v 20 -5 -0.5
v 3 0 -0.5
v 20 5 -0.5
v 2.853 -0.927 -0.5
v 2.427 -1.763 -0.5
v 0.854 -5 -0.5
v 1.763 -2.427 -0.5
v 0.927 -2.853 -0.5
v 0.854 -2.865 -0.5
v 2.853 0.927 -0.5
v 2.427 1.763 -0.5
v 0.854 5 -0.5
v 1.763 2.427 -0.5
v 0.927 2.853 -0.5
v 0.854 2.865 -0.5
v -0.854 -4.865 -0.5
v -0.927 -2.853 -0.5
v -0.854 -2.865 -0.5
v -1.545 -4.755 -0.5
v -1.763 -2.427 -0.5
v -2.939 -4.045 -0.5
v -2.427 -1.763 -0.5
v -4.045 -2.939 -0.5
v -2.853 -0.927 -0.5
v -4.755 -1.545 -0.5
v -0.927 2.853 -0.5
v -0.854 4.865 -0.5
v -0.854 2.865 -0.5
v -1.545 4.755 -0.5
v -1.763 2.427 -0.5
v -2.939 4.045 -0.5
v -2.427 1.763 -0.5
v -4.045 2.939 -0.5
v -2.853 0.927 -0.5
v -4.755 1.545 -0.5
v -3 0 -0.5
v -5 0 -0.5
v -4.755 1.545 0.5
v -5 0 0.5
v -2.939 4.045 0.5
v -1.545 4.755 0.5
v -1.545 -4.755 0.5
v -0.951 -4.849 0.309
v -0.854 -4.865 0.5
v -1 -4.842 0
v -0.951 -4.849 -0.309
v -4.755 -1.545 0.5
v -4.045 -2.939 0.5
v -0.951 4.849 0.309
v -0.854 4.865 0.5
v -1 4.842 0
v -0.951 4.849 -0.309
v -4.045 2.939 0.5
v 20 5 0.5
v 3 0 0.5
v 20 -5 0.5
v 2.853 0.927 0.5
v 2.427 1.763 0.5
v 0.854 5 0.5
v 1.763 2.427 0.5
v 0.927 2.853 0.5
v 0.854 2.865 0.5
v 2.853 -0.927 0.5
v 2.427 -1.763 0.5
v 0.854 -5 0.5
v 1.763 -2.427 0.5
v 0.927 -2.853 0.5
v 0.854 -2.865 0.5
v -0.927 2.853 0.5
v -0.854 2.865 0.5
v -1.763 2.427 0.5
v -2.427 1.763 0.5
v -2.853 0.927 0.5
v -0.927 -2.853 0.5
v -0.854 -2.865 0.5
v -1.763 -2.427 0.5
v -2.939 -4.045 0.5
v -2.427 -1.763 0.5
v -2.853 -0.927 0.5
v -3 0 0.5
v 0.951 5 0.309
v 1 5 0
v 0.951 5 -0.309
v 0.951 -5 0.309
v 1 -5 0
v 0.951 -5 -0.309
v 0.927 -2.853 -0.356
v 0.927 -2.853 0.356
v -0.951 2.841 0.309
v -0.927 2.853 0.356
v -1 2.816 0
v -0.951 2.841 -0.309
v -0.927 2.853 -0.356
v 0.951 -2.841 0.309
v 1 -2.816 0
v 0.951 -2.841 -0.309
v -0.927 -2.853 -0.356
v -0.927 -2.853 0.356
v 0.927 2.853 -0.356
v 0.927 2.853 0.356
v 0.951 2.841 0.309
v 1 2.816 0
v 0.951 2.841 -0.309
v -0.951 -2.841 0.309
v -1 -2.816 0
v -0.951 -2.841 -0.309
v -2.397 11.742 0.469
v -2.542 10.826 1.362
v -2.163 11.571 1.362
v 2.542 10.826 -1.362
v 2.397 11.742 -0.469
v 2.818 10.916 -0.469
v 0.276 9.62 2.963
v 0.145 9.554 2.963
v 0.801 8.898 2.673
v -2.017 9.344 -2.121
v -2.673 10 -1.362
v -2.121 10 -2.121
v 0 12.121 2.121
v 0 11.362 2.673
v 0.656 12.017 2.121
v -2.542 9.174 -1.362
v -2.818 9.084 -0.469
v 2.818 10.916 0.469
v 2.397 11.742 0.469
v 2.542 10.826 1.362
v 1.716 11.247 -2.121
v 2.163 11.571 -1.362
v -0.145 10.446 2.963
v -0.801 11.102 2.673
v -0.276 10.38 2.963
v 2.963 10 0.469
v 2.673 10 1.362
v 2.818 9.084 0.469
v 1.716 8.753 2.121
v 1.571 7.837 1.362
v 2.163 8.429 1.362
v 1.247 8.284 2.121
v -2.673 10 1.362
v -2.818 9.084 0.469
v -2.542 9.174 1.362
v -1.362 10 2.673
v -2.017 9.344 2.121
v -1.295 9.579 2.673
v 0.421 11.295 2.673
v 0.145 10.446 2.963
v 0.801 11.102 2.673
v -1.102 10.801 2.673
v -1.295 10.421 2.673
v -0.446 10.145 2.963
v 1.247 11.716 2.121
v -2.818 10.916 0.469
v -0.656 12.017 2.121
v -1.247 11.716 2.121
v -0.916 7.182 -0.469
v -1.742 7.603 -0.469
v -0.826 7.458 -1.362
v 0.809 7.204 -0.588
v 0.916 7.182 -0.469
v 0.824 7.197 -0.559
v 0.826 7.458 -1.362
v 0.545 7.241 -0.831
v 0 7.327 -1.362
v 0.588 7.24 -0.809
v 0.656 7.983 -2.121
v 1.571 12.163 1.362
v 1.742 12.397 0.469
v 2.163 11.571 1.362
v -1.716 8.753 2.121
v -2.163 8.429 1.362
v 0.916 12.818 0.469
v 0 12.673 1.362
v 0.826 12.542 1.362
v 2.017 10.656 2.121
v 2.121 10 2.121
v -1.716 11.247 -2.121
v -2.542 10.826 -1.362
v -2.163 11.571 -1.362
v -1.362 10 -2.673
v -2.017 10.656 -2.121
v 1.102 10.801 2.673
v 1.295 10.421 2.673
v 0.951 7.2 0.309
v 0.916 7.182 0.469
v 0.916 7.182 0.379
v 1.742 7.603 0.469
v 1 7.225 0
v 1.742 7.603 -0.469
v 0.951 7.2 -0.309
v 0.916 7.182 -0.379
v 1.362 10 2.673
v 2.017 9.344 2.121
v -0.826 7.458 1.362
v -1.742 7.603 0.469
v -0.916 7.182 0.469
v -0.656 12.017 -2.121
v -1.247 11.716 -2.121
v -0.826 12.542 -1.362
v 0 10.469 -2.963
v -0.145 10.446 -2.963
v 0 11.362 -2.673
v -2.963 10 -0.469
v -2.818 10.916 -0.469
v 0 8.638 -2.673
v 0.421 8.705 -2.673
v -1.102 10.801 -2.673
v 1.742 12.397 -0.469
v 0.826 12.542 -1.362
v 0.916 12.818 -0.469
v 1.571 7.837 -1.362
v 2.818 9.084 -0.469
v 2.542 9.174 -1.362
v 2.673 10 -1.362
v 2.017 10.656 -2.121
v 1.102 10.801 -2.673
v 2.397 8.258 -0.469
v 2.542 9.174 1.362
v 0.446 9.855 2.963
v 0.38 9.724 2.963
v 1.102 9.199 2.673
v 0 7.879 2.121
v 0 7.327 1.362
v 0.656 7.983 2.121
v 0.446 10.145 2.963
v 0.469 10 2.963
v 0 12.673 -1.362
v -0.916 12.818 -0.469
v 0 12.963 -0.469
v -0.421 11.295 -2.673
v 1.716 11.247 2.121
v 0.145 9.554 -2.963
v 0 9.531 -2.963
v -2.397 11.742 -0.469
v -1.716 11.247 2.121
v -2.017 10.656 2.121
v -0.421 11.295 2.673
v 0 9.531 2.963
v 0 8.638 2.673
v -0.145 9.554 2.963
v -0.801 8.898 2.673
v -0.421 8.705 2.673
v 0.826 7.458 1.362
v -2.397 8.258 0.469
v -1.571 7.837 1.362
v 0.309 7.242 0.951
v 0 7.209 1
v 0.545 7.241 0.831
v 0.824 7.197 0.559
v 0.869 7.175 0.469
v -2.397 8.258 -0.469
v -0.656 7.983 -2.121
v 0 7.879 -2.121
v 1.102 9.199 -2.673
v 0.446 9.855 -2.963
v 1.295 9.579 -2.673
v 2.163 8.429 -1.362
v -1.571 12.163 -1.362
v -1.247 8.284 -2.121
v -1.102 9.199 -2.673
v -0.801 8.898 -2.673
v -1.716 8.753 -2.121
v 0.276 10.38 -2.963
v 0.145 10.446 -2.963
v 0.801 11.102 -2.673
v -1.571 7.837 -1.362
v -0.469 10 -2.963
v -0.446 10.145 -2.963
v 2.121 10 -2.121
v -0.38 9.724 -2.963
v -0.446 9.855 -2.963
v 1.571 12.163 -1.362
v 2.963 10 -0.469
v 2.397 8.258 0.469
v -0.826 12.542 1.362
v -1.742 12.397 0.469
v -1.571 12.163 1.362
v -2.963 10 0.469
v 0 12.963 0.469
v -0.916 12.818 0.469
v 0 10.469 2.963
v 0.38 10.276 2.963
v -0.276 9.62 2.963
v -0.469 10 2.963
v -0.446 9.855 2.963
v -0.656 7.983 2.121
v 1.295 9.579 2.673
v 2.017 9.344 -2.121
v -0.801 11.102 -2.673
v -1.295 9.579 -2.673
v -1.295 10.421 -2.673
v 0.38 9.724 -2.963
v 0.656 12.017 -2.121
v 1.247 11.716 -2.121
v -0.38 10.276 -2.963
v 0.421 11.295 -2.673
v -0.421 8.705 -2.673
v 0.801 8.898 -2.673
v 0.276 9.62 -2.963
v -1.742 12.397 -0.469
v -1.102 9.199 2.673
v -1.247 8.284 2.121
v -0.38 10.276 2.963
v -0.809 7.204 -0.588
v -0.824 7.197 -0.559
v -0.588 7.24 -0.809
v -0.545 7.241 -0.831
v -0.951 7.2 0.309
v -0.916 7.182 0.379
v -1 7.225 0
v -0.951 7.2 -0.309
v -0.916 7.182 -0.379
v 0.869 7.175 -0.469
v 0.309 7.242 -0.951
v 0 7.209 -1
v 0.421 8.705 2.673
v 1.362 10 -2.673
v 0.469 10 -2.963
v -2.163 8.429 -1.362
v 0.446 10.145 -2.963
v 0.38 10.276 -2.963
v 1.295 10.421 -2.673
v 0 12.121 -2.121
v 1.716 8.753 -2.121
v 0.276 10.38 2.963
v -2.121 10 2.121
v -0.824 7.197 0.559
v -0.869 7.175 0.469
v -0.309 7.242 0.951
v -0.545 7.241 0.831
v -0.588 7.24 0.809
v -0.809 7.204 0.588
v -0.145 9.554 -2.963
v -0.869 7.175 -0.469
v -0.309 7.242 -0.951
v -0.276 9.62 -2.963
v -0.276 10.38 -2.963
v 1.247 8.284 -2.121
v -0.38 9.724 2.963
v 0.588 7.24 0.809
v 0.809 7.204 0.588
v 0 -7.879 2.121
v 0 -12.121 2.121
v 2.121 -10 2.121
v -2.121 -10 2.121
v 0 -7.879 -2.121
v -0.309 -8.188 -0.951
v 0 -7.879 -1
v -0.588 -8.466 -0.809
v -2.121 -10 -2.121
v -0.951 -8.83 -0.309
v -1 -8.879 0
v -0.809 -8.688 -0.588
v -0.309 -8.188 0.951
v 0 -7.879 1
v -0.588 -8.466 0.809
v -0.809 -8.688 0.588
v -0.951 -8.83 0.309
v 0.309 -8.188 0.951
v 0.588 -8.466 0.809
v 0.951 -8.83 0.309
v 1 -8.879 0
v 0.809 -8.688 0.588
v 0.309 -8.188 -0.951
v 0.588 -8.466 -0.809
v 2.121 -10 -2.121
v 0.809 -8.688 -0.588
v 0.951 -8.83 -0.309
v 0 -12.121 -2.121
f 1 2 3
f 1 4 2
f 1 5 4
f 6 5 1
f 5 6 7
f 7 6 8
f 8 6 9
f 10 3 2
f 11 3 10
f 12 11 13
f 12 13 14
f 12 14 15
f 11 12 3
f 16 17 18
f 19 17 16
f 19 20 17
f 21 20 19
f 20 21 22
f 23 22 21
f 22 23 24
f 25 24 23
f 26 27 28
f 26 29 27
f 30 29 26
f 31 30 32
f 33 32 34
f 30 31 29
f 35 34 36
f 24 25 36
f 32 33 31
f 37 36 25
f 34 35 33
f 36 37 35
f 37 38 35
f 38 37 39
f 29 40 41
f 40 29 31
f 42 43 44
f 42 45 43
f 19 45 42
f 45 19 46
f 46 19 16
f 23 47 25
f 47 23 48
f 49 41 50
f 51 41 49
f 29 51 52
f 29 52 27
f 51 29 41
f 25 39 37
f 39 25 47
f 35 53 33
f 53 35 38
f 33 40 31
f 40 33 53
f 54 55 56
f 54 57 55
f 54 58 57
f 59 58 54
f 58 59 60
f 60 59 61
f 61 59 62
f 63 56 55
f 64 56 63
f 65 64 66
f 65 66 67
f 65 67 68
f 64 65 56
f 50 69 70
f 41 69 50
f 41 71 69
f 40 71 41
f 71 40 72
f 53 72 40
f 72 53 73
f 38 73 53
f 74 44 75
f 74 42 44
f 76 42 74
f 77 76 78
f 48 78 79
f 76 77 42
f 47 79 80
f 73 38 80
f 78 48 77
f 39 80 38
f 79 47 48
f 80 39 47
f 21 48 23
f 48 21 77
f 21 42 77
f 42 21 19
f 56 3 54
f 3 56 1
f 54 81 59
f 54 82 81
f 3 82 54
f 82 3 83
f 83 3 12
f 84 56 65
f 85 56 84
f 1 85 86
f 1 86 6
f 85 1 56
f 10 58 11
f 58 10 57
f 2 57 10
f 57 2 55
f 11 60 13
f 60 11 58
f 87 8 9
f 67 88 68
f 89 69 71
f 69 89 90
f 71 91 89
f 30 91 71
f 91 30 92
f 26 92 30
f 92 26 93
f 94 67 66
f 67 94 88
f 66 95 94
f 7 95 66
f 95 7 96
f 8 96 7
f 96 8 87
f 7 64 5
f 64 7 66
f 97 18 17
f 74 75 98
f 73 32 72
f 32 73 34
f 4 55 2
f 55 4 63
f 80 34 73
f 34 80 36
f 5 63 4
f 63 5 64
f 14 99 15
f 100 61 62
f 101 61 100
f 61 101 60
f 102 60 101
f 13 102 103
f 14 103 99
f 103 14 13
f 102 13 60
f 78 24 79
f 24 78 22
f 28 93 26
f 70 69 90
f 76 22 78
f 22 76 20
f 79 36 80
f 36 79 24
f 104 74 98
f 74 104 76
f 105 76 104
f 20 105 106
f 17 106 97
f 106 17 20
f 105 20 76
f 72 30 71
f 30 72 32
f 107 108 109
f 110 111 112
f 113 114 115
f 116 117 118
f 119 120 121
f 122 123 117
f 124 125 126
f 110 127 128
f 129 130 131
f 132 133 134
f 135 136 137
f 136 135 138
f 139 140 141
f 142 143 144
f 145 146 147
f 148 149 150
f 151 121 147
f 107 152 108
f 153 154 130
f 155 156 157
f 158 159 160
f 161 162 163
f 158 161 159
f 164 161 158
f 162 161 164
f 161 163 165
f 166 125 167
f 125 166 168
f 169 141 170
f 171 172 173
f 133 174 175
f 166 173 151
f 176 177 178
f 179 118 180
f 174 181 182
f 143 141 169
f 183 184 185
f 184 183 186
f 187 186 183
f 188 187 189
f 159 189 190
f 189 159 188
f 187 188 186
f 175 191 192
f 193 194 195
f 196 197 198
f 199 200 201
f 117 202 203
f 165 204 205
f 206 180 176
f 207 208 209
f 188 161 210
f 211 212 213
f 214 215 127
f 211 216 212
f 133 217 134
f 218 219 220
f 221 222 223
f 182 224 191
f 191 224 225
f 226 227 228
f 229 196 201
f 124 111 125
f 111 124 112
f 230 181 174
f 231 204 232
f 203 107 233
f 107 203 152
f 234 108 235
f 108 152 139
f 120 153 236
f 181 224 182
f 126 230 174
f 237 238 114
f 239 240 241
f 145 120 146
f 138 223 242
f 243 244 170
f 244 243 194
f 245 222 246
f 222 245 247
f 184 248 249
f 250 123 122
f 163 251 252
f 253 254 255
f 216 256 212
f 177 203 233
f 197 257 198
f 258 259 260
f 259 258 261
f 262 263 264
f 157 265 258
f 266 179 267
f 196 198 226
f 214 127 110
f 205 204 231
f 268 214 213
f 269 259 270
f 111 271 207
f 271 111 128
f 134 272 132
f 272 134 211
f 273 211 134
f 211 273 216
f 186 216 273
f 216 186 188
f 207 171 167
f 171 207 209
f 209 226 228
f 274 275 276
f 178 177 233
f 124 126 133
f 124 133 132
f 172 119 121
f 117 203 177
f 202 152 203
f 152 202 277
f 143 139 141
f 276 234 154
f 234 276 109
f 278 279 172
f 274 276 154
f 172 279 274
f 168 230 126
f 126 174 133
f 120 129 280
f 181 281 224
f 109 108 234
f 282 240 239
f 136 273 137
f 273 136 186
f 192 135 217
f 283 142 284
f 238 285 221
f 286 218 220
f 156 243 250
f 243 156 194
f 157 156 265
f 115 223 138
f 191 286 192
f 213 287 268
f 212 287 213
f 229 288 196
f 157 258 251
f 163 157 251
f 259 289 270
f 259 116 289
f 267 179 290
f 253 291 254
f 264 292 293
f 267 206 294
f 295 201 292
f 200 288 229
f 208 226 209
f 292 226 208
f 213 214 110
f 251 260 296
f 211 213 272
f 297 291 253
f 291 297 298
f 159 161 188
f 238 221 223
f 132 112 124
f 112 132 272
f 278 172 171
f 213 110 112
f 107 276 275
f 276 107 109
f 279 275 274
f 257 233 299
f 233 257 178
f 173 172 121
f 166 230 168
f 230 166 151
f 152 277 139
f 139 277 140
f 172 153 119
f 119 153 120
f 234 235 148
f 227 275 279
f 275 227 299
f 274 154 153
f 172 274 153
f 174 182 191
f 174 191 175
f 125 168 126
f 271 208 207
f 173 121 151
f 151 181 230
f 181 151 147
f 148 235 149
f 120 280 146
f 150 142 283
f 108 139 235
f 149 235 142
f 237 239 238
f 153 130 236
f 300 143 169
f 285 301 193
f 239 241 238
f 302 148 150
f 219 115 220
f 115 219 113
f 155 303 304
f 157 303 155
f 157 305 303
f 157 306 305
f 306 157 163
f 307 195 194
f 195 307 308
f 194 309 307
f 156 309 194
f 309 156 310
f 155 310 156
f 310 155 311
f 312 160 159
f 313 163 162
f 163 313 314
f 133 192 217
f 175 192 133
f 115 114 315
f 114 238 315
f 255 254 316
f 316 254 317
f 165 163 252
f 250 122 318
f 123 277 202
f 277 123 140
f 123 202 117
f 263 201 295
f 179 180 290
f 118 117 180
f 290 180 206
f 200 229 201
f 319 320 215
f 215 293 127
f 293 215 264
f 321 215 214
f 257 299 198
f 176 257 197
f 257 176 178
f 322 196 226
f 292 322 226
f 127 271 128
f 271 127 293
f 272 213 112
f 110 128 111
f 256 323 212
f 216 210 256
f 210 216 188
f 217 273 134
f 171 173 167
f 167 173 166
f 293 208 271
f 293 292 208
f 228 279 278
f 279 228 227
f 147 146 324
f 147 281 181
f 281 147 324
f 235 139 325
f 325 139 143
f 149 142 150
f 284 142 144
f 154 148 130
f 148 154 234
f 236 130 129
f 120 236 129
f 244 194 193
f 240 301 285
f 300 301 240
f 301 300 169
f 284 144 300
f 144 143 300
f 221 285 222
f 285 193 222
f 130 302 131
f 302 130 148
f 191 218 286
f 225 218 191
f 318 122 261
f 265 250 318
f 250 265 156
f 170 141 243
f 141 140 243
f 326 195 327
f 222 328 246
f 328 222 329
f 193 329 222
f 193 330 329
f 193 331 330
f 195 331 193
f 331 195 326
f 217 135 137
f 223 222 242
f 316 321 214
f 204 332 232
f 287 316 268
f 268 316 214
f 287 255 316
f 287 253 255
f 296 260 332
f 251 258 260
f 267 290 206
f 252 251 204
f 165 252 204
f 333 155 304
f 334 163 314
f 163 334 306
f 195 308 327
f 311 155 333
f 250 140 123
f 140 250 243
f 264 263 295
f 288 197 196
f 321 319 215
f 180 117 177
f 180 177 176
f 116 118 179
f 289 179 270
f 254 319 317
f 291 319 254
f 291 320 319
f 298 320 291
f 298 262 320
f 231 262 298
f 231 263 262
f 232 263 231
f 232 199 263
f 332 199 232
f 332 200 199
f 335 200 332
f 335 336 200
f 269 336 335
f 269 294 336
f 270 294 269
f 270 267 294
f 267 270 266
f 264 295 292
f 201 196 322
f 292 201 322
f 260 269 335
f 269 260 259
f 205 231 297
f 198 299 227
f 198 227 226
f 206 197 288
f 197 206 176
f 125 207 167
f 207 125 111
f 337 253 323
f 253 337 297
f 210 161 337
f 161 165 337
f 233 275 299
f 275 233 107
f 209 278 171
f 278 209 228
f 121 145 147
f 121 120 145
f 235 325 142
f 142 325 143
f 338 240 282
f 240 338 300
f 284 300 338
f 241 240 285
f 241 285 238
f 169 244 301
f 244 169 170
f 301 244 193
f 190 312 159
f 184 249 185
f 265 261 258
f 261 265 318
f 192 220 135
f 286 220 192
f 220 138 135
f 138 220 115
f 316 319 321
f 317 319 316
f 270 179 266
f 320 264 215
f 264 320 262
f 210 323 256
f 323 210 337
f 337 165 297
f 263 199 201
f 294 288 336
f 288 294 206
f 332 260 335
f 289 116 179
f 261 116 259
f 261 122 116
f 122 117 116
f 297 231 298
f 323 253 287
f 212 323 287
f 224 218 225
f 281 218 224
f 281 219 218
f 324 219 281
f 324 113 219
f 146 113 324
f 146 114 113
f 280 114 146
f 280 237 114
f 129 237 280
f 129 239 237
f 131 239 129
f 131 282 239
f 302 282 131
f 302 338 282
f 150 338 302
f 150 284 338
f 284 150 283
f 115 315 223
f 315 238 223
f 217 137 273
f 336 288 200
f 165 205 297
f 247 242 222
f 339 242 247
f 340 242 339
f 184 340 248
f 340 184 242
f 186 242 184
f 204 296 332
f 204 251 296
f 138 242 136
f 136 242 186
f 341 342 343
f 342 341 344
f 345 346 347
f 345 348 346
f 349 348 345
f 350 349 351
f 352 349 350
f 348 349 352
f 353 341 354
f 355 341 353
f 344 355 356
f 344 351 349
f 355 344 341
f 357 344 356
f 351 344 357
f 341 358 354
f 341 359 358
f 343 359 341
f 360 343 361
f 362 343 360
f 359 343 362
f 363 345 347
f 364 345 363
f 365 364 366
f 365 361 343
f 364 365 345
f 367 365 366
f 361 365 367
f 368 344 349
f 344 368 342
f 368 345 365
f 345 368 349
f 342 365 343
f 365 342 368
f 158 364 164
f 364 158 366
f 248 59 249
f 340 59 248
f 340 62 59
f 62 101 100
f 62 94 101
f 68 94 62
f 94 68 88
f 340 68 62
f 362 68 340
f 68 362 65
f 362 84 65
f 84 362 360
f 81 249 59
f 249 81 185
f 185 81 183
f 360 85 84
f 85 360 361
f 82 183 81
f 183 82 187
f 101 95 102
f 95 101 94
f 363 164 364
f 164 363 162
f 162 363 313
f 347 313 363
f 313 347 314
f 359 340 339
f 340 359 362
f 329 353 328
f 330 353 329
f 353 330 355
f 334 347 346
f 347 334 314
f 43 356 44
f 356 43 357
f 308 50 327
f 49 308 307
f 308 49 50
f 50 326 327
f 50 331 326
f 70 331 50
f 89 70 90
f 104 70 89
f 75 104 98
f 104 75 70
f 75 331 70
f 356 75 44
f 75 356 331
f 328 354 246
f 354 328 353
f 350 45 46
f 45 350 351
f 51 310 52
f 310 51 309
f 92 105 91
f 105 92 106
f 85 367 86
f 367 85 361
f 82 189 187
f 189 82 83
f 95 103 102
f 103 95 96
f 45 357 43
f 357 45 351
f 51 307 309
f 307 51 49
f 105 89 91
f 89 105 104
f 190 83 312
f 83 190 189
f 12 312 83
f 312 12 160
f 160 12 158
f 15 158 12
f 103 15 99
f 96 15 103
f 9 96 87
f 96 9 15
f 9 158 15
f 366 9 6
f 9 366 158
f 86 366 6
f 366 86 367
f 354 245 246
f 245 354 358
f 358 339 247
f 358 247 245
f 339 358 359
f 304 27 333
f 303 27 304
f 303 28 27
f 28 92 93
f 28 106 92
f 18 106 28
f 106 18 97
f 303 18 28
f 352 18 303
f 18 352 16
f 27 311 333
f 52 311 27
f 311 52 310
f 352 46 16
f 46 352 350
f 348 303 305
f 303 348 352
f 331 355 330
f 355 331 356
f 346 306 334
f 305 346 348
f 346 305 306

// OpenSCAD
$fn = 20;

module dumbbell() {
    rotate([90, 0, 0]) {
      cylinder (h=20, r=1, center = true);
    }

    color("gray") {
        translate([0, 10, 0]) sphere(3, $fn = 20);
        translate([0, -10, 0]) sphere(3, $fn = 4);
    }
}


module fob() {
    difference() {
        color("blue") union(){
          cylinder (h=1, r=5, center = true);
          translate([10, 0, 0]) cube([20, 10, 1], center = true);
        }
        cylinder (h=2, r=3, center = true);
    }
}

fob();

dumbbell();
